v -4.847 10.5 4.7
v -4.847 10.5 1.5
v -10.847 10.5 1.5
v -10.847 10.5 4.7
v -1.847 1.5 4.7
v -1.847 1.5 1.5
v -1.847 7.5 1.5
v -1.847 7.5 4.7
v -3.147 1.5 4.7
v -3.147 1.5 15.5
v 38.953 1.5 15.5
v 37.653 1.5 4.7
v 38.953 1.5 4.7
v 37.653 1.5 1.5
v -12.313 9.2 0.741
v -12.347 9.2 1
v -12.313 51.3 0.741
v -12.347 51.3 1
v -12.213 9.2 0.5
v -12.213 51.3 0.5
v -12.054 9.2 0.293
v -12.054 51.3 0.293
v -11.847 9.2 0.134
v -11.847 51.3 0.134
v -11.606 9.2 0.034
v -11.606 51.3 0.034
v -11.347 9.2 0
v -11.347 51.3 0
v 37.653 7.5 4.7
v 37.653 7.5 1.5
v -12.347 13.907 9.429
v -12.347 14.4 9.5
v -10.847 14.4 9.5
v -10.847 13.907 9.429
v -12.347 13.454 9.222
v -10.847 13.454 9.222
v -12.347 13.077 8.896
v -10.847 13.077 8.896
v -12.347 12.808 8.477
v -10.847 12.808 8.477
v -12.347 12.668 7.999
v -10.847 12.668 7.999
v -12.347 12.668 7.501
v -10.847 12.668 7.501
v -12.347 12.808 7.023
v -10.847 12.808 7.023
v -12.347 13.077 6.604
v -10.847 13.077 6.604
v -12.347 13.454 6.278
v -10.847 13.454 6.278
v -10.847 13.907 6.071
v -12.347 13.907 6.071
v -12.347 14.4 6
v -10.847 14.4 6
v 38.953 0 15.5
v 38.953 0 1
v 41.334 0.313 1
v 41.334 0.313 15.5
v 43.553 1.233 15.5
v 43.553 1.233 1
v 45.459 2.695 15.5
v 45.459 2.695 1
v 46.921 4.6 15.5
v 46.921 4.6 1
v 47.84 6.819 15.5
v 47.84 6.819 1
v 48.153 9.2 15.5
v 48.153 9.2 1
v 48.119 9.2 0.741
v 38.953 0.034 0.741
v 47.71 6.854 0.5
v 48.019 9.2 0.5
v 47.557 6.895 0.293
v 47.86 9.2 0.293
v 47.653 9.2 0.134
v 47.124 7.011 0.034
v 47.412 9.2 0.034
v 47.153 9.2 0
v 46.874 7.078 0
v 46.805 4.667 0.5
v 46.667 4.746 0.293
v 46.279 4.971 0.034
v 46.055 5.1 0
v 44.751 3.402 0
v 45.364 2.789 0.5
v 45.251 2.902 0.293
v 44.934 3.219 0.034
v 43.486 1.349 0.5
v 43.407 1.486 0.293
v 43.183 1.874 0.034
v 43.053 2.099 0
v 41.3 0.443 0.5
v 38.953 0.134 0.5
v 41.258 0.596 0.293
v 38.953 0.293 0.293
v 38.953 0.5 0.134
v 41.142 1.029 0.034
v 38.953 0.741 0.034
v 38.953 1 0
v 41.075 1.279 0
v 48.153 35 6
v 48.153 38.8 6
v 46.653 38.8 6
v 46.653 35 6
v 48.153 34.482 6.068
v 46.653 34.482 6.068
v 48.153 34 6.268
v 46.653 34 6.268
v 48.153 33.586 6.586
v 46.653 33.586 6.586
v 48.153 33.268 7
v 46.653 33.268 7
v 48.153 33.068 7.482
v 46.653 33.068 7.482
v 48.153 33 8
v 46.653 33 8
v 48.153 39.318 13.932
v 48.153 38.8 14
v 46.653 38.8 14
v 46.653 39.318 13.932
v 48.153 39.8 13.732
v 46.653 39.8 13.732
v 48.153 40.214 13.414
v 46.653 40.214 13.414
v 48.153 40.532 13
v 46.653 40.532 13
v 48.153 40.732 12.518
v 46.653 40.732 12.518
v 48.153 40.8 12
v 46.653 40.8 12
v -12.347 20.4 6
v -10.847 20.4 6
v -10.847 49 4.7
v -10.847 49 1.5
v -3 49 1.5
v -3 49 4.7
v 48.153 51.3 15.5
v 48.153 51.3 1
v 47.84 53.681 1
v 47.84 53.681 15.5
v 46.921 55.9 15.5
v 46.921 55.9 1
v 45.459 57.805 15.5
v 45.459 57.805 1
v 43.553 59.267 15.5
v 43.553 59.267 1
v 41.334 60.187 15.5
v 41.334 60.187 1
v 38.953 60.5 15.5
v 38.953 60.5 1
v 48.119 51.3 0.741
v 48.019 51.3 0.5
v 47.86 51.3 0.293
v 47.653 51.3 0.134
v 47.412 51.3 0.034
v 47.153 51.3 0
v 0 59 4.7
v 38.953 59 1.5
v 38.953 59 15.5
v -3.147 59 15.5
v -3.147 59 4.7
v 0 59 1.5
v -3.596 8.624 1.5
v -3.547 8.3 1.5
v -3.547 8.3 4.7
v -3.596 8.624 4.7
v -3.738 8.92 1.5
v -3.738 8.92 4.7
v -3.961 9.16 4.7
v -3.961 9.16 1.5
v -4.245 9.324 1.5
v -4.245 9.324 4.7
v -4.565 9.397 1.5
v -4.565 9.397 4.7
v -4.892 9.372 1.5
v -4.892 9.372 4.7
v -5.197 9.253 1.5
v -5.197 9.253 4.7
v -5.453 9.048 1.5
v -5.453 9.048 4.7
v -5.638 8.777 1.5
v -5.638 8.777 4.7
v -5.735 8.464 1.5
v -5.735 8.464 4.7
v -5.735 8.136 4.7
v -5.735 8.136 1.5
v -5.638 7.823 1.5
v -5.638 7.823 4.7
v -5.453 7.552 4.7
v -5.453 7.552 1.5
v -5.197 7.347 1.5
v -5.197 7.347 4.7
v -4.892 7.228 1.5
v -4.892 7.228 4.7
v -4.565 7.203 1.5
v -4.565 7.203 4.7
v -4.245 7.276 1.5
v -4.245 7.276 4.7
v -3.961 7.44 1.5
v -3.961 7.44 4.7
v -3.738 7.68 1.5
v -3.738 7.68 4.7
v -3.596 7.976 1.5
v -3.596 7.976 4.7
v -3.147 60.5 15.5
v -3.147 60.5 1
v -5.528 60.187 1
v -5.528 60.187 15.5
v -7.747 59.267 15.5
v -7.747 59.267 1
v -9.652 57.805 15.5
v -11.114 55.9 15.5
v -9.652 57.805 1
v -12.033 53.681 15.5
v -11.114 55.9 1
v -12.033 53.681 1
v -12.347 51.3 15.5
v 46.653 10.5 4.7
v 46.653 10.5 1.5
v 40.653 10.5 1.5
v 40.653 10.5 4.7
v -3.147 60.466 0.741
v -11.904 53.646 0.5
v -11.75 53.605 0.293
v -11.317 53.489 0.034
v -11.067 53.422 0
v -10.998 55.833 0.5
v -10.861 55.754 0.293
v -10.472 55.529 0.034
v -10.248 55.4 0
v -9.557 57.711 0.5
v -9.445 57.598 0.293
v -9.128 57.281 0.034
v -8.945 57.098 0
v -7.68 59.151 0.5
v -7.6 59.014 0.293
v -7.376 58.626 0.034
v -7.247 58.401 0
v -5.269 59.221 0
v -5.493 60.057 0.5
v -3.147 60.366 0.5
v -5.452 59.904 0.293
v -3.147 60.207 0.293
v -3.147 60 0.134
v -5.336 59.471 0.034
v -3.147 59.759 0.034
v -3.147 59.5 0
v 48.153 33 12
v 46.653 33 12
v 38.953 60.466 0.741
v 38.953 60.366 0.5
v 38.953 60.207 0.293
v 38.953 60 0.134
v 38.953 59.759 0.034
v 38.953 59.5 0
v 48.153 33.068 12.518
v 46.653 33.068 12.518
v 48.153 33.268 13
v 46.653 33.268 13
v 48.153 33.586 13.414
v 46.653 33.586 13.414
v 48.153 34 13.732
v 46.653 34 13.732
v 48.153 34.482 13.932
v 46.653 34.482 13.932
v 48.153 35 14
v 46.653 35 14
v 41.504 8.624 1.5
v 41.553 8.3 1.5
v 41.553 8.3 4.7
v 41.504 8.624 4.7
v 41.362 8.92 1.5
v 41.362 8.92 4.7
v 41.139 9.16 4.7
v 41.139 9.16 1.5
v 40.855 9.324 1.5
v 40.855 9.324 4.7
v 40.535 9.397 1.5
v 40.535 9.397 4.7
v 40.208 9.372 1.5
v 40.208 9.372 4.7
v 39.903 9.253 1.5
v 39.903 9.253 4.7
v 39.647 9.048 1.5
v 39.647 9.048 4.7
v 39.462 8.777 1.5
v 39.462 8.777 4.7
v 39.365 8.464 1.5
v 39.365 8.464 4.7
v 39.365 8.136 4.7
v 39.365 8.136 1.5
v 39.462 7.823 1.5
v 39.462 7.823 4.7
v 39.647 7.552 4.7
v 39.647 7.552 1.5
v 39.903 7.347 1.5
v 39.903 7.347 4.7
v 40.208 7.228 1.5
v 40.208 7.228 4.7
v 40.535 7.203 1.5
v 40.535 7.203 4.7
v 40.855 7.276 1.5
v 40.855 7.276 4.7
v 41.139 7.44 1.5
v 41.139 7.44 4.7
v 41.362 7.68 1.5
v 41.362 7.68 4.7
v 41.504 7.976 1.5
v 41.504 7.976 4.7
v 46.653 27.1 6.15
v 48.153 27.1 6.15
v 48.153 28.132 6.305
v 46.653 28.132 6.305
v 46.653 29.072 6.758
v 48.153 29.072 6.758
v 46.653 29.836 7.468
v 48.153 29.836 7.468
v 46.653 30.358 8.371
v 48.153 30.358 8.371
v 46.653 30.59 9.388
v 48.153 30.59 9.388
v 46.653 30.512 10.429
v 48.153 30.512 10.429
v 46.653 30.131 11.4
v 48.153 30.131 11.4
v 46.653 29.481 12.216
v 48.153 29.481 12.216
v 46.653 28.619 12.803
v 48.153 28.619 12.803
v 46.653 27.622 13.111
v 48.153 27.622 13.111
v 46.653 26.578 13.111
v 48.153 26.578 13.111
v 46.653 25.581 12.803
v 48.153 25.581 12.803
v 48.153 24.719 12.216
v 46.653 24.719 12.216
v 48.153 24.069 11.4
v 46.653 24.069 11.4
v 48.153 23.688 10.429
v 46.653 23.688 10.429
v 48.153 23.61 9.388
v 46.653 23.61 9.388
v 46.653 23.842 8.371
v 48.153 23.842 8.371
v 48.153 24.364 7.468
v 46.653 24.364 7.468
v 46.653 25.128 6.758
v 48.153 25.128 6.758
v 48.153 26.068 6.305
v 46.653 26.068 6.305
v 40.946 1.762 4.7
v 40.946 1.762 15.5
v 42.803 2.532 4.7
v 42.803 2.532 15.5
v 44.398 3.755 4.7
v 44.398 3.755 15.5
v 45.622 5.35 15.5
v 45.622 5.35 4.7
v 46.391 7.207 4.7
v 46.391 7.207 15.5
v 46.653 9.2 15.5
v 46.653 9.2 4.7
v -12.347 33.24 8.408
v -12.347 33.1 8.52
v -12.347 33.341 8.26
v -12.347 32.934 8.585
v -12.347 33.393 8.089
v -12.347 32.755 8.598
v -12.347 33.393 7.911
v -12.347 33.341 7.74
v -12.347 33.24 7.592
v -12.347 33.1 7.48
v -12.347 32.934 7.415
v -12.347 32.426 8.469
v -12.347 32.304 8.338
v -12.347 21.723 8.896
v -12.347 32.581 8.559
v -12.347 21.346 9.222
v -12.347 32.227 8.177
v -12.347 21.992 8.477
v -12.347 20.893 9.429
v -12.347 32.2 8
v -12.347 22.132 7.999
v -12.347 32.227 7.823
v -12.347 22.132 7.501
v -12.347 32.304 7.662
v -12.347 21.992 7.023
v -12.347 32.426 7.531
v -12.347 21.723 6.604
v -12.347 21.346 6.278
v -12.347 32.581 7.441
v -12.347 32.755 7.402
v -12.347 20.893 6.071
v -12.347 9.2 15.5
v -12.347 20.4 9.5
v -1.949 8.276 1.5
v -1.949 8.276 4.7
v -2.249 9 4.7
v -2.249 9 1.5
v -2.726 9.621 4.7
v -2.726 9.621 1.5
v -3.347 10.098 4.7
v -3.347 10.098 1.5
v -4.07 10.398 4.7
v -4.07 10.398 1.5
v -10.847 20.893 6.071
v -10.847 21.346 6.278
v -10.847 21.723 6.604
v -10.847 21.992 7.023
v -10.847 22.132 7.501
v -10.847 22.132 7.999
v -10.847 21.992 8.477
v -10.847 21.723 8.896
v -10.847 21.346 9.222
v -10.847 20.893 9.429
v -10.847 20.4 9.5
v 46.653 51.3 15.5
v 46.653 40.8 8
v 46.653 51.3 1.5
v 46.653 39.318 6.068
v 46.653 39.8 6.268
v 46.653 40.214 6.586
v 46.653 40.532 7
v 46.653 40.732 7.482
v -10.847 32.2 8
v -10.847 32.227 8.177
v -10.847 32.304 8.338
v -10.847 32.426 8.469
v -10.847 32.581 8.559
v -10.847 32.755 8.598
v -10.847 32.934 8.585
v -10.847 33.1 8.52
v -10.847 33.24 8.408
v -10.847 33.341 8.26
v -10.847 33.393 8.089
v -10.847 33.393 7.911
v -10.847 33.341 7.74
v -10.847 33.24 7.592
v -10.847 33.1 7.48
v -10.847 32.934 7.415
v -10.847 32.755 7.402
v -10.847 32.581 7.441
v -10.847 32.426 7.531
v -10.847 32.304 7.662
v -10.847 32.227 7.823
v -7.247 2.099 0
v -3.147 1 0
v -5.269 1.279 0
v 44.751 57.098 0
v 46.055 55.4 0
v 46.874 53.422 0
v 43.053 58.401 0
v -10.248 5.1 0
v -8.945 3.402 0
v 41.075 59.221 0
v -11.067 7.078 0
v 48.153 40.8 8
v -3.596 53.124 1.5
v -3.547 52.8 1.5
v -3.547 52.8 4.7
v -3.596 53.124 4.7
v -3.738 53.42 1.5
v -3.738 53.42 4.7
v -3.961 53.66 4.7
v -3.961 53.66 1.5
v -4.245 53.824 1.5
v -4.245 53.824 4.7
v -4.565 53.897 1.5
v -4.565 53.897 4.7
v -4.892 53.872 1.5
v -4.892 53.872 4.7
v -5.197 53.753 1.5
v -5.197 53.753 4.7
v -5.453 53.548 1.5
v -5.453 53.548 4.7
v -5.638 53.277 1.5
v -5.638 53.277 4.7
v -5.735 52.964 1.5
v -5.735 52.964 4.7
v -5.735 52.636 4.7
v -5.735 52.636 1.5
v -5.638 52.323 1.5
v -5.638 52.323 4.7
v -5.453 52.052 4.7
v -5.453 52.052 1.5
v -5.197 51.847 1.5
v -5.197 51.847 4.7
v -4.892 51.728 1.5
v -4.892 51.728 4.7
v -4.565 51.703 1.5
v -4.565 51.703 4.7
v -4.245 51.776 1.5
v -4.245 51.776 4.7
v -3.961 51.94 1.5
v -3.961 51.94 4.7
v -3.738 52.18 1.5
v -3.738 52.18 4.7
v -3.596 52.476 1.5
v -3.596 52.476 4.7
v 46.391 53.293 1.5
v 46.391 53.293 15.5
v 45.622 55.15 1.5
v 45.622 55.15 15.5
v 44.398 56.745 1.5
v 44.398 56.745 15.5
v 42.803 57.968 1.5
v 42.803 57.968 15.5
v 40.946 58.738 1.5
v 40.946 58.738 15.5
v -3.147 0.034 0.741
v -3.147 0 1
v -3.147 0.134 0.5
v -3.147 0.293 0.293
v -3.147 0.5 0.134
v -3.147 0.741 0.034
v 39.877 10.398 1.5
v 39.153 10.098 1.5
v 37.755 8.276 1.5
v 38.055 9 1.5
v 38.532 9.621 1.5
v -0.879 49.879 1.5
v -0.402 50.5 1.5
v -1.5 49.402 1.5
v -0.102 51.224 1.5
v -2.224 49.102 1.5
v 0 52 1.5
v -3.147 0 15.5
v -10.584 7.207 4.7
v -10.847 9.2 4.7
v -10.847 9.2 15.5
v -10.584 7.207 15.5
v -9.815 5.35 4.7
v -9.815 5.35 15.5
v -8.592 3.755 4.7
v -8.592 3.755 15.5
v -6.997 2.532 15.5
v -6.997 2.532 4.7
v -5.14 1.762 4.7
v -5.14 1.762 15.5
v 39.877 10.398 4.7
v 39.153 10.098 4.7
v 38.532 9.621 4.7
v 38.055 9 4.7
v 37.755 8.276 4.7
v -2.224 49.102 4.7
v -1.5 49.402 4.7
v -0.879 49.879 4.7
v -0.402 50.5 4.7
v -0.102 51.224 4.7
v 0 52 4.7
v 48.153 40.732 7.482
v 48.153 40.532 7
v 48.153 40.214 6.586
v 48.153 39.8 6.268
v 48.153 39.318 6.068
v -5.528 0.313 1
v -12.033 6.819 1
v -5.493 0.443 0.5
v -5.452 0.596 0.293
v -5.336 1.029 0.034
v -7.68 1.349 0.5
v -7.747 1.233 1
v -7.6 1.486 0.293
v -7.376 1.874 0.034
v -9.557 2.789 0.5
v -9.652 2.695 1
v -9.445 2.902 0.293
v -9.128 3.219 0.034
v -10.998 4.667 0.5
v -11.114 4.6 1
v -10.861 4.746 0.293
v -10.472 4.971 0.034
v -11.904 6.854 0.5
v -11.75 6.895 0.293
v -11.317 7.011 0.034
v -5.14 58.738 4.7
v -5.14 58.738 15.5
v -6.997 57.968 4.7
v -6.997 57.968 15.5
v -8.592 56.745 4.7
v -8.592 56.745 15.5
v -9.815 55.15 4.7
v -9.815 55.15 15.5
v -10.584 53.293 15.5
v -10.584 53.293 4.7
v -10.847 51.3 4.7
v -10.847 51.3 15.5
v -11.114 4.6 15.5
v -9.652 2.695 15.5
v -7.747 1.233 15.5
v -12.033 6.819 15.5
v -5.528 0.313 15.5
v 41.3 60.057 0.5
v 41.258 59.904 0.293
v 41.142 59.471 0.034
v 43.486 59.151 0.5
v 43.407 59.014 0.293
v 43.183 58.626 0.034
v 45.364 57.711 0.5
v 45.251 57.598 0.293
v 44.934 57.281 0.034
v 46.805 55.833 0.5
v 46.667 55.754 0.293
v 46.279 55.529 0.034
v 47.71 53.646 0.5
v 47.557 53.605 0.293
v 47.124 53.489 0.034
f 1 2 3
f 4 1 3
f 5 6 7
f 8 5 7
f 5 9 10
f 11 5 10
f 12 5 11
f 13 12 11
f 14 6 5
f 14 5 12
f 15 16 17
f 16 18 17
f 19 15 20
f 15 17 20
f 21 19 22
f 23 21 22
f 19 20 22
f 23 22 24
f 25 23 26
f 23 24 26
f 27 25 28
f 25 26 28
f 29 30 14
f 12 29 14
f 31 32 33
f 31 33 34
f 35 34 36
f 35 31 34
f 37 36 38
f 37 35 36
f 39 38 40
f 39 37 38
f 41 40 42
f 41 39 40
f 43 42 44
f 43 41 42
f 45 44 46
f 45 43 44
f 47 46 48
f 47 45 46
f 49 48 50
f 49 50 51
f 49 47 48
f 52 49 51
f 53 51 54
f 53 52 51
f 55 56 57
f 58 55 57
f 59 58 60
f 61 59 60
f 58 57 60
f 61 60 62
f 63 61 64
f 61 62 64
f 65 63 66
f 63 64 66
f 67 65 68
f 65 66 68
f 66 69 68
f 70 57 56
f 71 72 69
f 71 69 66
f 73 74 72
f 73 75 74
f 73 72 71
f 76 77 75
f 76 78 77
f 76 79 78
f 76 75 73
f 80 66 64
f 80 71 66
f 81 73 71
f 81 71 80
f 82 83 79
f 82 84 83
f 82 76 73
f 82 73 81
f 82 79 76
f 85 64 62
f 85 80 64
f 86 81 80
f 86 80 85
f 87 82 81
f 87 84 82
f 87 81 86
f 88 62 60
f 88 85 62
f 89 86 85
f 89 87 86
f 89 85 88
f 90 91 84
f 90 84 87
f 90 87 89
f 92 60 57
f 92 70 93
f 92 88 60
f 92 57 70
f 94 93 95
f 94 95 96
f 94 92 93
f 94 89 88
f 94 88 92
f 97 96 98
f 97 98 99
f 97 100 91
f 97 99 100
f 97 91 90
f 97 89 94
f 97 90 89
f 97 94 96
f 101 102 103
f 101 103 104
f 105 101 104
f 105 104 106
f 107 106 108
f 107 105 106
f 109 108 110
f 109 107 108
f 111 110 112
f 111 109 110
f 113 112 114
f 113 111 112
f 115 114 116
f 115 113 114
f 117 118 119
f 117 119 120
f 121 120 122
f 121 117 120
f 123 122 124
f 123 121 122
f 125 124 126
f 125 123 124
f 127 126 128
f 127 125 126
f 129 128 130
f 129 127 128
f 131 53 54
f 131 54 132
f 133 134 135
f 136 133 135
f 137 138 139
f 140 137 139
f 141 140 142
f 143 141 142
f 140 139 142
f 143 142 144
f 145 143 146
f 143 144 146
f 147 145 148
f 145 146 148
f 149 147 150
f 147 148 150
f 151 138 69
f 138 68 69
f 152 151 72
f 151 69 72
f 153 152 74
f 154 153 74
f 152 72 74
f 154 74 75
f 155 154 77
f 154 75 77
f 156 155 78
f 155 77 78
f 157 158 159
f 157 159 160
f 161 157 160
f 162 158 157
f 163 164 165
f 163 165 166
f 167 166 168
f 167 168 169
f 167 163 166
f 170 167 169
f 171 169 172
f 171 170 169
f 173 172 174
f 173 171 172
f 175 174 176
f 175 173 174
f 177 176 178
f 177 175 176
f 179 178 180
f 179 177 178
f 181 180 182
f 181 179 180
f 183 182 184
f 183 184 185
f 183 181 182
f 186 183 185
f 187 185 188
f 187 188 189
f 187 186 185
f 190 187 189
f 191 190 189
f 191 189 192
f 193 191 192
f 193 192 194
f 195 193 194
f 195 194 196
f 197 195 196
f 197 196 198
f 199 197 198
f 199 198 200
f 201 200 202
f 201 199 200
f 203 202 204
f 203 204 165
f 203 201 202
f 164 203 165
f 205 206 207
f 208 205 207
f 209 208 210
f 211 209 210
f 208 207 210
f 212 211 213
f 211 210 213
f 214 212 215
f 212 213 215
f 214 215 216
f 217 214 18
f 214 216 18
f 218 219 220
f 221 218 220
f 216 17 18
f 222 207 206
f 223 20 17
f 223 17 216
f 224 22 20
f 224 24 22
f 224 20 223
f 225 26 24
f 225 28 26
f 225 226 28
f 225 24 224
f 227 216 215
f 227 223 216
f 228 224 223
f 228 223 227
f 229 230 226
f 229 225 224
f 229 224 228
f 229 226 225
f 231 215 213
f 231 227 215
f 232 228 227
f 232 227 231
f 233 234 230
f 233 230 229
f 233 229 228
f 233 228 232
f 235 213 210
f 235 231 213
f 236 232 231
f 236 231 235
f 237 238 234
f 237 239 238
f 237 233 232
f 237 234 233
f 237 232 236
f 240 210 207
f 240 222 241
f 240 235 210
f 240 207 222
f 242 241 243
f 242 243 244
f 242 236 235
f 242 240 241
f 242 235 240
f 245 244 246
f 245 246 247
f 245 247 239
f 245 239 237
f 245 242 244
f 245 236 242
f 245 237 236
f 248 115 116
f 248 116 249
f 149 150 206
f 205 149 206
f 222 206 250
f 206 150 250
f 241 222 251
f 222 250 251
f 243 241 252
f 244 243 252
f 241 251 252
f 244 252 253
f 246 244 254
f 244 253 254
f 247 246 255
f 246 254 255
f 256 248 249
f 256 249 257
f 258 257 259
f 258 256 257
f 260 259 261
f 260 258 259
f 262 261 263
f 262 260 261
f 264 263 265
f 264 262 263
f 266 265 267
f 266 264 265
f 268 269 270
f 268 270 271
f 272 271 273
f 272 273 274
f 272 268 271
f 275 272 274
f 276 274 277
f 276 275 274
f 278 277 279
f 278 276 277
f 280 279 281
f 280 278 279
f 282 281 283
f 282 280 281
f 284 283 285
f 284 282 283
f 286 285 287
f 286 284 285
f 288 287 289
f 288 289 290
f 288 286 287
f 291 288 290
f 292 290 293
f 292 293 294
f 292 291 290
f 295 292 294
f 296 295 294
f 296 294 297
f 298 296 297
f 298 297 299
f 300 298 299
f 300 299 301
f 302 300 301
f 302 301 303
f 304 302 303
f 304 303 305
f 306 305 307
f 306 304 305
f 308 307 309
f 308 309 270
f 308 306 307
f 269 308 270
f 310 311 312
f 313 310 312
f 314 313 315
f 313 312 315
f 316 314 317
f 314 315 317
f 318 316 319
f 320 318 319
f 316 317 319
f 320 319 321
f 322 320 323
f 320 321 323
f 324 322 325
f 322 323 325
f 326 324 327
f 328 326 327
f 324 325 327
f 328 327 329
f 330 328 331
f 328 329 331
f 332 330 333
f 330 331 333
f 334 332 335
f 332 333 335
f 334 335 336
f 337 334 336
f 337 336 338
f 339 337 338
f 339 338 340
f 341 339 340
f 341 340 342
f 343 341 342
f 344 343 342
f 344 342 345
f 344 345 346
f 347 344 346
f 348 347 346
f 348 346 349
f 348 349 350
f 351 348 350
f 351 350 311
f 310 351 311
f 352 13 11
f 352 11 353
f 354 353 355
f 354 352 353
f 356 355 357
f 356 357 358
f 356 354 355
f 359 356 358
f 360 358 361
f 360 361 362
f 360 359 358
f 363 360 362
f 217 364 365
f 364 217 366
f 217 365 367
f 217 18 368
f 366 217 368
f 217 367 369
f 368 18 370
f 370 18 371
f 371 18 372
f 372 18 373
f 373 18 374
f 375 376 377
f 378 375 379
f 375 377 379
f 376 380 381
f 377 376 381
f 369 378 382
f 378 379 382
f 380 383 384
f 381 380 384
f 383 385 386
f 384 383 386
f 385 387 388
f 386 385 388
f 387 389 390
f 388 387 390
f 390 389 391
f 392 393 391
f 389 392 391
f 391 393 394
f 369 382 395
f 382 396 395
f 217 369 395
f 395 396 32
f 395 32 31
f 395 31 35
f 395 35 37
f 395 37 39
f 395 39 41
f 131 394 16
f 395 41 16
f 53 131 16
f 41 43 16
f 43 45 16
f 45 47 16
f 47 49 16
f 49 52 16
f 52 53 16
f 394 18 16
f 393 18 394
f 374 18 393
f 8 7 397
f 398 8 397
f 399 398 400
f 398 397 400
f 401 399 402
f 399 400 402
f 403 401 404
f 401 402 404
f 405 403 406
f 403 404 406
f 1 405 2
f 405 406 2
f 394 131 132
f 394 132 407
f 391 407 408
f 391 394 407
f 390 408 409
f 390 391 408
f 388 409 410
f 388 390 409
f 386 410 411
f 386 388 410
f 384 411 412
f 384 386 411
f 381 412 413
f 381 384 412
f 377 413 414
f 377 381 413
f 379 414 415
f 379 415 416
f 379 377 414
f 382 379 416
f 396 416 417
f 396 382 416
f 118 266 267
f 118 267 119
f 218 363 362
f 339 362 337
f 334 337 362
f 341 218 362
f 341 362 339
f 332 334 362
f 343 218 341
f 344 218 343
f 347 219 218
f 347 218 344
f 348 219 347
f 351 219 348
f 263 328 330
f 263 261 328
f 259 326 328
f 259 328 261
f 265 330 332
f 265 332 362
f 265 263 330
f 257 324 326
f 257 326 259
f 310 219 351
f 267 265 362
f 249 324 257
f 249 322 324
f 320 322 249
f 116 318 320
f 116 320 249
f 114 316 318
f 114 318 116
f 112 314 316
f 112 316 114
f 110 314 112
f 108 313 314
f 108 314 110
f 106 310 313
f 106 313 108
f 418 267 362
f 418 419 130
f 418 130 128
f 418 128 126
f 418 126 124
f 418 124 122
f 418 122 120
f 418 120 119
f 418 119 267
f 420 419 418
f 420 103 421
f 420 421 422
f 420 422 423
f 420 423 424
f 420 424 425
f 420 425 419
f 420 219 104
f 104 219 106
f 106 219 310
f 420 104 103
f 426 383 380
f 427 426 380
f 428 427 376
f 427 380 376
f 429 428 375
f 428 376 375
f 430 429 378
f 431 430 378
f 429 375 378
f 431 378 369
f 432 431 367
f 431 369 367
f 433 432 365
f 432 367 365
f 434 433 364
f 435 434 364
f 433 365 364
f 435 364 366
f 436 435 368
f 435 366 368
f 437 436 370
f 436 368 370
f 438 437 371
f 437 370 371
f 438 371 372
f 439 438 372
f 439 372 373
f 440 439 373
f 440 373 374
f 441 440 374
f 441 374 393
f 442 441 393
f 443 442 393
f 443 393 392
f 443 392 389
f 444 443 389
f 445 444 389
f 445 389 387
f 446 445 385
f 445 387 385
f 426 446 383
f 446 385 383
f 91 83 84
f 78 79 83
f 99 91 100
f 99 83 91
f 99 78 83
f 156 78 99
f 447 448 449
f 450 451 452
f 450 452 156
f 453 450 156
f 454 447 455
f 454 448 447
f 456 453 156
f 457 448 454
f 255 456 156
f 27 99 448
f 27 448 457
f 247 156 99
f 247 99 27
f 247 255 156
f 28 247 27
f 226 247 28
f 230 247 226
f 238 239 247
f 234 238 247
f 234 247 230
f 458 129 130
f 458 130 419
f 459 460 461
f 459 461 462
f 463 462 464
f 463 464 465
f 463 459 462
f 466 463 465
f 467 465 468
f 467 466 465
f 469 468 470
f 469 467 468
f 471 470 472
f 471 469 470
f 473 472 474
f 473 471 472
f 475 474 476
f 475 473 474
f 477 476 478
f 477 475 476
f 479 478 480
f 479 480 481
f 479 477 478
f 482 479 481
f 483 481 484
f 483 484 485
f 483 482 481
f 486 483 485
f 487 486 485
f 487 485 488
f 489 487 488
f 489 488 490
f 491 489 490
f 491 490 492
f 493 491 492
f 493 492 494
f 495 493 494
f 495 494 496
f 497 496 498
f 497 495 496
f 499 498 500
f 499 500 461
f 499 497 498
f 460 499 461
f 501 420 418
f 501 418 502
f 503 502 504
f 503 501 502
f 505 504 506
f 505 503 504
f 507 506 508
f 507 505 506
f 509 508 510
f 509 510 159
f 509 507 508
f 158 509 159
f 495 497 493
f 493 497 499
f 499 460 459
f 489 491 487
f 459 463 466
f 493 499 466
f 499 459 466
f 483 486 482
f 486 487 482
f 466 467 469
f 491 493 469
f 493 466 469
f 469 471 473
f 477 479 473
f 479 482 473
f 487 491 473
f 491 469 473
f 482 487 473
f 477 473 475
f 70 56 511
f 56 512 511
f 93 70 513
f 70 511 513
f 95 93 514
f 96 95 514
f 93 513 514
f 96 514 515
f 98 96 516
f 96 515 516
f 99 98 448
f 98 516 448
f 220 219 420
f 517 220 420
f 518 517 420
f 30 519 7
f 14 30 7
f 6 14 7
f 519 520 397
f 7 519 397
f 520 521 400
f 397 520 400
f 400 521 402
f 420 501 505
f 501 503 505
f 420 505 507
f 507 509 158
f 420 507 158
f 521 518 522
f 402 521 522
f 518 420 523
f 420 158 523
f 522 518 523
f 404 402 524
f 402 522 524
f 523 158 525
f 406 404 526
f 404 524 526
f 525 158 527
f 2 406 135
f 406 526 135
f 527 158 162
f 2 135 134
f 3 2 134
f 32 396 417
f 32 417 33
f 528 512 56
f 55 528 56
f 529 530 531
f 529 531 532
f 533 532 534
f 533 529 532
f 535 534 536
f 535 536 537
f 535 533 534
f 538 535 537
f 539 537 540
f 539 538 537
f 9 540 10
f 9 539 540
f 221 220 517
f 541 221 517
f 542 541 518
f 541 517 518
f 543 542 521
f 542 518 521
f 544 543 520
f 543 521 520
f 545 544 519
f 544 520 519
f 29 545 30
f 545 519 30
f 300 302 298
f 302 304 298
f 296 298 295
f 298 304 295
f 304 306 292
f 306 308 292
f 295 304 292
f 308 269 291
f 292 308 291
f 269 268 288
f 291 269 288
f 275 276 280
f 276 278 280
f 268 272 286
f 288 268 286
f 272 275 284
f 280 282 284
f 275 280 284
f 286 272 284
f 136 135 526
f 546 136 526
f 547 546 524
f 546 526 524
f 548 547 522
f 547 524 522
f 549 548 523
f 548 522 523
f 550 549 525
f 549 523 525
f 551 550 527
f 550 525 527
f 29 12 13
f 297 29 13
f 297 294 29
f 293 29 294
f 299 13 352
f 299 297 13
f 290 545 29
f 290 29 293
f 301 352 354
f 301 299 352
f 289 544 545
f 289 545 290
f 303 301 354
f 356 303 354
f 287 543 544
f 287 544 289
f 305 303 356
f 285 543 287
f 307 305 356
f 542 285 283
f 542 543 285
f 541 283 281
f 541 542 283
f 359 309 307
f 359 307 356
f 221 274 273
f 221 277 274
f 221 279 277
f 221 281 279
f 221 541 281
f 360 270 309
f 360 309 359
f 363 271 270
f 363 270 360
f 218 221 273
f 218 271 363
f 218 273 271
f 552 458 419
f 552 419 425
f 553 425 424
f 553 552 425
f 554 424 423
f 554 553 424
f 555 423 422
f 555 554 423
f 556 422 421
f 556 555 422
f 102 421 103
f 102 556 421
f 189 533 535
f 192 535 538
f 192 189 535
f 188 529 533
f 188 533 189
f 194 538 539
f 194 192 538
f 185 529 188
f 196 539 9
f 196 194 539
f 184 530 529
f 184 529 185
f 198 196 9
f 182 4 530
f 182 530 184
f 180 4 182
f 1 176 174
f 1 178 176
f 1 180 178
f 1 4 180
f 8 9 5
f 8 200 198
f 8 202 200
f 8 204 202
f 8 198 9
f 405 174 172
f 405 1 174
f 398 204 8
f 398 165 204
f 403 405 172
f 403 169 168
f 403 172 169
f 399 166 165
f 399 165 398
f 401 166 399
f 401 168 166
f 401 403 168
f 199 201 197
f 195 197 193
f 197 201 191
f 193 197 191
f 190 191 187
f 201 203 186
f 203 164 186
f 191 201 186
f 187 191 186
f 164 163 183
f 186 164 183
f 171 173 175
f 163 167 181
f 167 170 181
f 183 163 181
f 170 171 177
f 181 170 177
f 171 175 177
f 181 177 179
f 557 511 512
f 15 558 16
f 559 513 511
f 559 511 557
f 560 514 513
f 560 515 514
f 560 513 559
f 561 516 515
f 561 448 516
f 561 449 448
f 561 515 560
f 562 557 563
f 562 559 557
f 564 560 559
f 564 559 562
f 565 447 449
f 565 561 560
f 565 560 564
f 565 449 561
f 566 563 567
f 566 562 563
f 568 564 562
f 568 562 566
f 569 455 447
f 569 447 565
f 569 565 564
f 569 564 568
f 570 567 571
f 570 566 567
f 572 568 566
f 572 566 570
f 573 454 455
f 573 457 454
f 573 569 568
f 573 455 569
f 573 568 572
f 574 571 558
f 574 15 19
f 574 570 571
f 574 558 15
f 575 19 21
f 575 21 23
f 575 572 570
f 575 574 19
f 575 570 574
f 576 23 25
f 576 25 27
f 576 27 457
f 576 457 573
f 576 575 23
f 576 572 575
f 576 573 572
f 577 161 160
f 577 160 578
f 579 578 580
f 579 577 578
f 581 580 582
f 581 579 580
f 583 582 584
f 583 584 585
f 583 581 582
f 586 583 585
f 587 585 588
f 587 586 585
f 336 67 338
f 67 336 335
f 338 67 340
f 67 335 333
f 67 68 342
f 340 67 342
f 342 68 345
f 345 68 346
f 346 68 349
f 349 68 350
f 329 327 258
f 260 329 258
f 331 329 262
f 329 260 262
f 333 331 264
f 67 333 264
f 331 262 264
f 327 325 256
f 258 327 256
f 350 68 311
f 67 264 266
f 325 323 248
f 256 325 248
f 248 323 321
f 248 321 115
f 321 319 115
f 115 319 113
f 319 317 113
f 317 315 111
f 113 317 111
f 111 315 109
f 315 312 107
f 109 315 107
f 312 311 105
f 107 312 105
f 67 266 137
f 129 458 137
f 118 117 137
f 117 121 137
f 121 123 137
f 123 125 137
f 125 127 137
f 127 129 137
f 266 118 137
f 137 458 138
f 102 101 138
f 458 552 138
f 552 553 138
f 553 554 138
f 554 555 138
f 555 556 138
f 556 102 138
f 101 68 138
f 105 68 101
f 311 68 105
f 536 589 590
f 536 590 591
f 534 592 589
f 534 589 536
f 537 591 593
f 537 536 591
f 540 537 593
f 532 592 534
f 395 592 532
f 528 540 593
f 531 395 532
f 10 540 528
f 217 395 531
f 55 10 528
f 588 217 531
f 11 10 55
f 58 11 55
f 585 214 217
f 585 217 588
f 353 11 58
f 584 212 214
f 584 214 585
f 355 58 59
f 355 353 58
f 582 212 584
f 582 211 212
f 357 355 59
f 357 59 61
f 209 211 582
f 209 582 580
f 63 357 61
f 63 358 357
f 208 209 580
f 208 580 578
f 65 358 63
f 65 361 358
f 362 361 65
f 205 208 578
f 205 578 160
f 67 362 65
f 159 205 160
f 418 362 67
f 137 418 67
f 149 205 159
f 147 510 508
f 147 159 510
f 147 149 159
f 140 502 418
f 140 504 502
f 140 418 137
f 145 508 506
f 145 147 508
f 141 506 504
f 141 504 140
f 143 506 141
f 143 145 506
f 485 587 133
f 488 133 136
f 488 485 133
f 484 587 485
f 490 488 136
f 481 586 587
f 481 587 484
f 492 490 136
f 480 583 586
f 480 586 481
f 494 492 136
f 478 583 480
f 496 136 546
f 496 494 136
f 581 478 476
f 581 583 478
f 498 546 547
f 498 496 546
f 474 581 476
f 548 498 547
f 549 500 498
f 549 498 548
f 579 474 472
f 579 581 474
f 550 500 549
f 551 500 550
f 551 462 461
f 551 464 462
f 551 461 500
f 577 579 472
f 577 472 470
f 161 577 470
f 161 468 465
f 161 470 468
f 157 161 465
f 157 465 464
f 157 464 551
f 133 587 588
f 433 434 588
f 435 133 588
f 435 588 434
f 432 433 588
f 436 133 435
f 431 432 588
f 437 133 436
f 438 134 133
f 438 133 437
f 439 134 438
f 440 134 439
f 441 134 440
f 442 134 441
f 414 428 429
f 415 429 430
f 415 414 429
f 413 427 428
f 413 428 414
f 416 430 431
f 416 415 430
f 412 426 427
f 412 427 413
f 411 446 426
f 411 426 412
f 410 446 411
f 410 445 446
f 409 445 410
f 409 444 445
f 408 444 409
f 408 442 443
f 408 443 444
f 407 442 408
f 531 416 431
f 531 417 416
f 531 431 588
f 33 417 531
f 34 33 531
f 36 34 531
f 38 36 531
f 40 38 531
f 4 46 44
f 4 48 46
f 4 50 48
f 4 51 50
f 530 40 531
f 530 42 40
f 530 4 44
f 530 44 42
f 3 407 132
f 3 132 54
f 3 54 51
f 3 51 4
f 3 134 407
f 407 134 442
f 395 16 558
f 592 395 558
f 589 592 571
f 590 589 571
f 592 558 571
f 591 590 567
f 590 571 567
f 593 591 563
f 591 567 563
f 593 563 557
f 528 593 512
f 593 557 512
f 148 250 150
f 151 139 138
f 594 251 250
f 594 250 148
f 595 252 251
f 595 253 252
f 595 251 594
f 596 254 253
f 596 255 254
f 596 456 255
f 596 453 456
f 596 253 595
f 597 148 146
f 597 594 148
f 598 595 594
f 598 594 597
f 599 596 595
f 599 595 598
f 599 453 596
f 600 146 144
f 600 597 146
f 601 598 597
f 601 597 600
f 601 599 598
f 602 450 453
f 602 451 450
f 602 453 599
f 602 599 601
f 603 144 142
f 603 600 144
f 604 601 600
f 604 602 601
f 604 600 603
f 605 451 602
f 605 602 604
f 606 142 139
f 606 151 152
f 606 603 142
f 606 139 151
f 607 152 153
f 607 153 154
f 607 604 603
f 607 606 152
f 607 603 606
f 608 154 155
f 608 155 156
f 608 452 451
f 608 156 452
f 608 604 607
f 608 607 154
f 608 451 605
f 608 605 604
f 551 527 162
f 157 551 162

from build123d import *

# Parameters (mm, degrees)
EXTRUDE_1_DEPTH     = 1.5
EXTRUDE_3_DEPTH     = 14
SKETCH_4_R          = 1.1
EXTRUDE_4_DEPTH     = 3.2
SKETCH_5_R          = 1.1
EXTRUDE_5_DEPTH     = 3.2
SKETCH_8_R          = 1.1
EXTRUDE_7_DEPTH     = 3.2
SKETCH_9_R          = 0.6
CUT_EXTRUDE_5_DEPTH = 1.5
CUT_EXTRUDE_6_DEPTH = 1.5
CUT_EXTRUDE_7_REACH = 88.953
SKETCH_16_R         = 3.5
FILLET_1_R          = 1


with BuildPart() as part:
    # 草图1 → 凸台-拉伸1 (new body)
    with BuildSketch(Plane.XY):
        with BuildLine():
            Line((-3.146845785, 60.5), (38.953154215, 60.5))
            ThreePointArc((38.953154215, 60.5), (45.458536602, 57.805382387), (48.153154215, 51.3))
            Line((48.153154215, 51.3), (48.153154215, 9.2))
            ThreePointArc((48.153154215, 9.2), (45.458536602, 2.694617613), (38.953154215, 0))
            Line((38.953154215, 0), (-3.146845785, 0))
            ThreePointArc((-3.146845785, 0), (-9.652228172, 2.694617613), (-12.346845785, 9.2))
            Line((-12.346845785, 9.2), (-12.346845785, 51.3))
            ThreePointArc((-12.346845785, 51.3), (-9.652228172, 57.805382387), (-3.146845785, 60.5))
        make_face()
    extrude(amount=EXTRUDE_1_DEPTH)

    # 草图3 → 凸台-拉伸3 (add)
    with BuildSketch(Plane.XY.offset(1.5)):
        with BuildLine():
            Line((38.953154215, 60.5), (-3.146845785, 60.5))
            ThreePointArc((-3.146845785, 60.5), (-9.652228172, 57.805382387), (-12.346845785, 51.3))
            Line((-12.346845785, 51.3), (-12.346845785, 9.2))
            ThreePointArc((-12.346845785, 9.2), (-9.652228172, 2.694617613), (-3.146845785, 0))
            Line((-3.146845785, 0), (38.953154215, 0))
            ThreePointArc((38.953154215, 0), (45.458536602, 2.694617613), (48.153154215, 9.2))
            Line((48.153154215, 9.2), (48.153154215, 51.3))
            ThreePointArc((48.153154215, 51.3), (45.458536602, 57.805382387), (38.953154215, 60.5))
        make_face()
        with BuildLine():
            Line((38.953154215, 59), (-3.146845785, 59))
            ThreePointArc((-3.146845785, 59), (-8.591568001, 56.744722215), (-10.846845785, 51.3))
            Line((-10.846845785, 51.3), (-10.846845785, 9.2))
            ThreePointArc((-10.846845785, 9.2), (-8.591568001, 3.755277785), (-3.146845785, 1.5))
            Line((-3.146845785, 1.5), (38.953154215, 1.5))
            ThreePointArc((38.953154215, 1.5), (44.39787643, 3.755277785), (46.653154215, 9.2))
            Line((46.653154215, 9.2), (46.653154215, 51.3))
            ThreePointArc((46.653154215, 51.3), (44.39787643, 56.744722215), (38.953154215, 59))
        make_face(mode=Mode.SUBTRACT)
    extrude(amount=EXTRUDE_3_DEPTH)

    # 草图4 → 凸台-拉伸4 (add)
    with BuildSketch(Plane.XY.offset(1.5)):
        with BuildLine():
            Line((0, 52), (0, 59))
            Line((0, 59), (-3.146845785, 59))
            ThreePointArc((-3.146845785, 59), (-8.591568001, 56.744722215), (-10.846845785, 51.3))
            Line((-10.846845785, 51.3), (-10.846845785, 49))
            Line((-10.846845785, 49), (-3, 49))
            ThreePointArc((-3, 49), (-0.878679656, 49.878679656), (0, 52))
        make_face()
        with Locations((-4.646845785, 52.8)):
            Circle(SKETCH_4_R, mode=Mode.SUBTRACT)
    extrude(amount=EXTRUDE_4_DEPTH)

    # 草图5 → 凸台-拉伸5 (add)
    with BuildSketch(Plane.XY.offset(1.5)):
        with BuildLine():
            Line((-4.846845785, 10.5), (-10.846845785, 10.5))
            Line((-10.846845785, 10.5), (-10.846845785, 9.2))
            ThreePointArc((-10.846845785, 9.2), (-8.591568001, 3.755277785), (-3.146845785, 1.5))
            Line((-3.146845785, 1.5), (-1.846845785, 1.5))
            Line((-1.846845785, 1.5), (-1.846845785, 7.5))
            ThreePointArc((-1.846845785, 7.5), (-2.725525442, 9.621320344), (-4.846845785, 10.5))
        make_face()
        with Locations((-4.646845785, 8.3)):
            Circle(SKETCH_5_R, mode=Mode.SUBTRACT)
    extrude(amount=EXTRUDE_5_DEPTH)

    # 草图8 → 凸台-拉伸7 (add)
    with BuildSketch(Plane.XY.offset(1.5)):
        with BuildLine():
            Line((37.653154215, 7.5), (37.653154215, 1.5))
            Line((37.653154215, 1.5), (38.953154215, 1.5))
            ThreePointArc((38.953154215, 1.5), (44.39787643, 3.755277785), (46.653154215, 9.2))
            Line((46.653154215, 9.2), (46.653154215, 10.5))
            Line((46.653154215, 10.5), (40.653154215, 10.5))
            ThreePointArc((40.653154215, 10.5), (38.531833871, 9.621320344), (37.653154215, 7.5))
        make_face()
        with Locations((40.453154215, 8.3)):
            Circle(SKETCH_8_R, mode=Mode.SUBTRACT)
    extrude(amount=EXTRUDE_7_DEPTH)

    # 草图9 → 切除-拉伸5 (cut)
    with BuildSketch(Plane.ZY.offset(12.346845785)):
        with Locations(Location((8, 32.8, 0), (0, 0, 270))):
            Circle(SKETCH_9_R)
    extrude(amount=-CUT_EXTRUDE_5_DEPTH, mode=Mode.SUBTRACT)

    # 草图10 → 切除-拉伸6 (cut)
    with BuildSketch(Plane.ZY.offset(12.346845785)):
        with BuildLine():
            Line((9.5, 20.4), (9.5, 14.4))
            ThreePointArc((9.5, 14.4), (7.75, 12.65), (6, 14.4))
            Line((6, 14.4), (6, 20.4))
            ThreePointArc((6, 20.4), (7.75, 22.15), (9.5, 20.4))
        make_face()
    extrude(amount=-CUT_EXTRUDE_6_DEPTH, mode=Mode.SUBTRACT)

    # 草图16 → 切除-拉伸7 (cut, up to next)
    with BuildSketch(Plane(origin=(48.153154215, 0, 0), x_dir=(0, 0, -1), z_dir=(1, 0, 0)), mode=Mode.PRIVATE) as cut_extrude_7_sk1:
        with Locations((-9.65, 27.1)):
            Circle(SKETCH_16_R)
    cut_extrude_7_tool1 = extrude(cut_extrude_7_sk1.sketch, amount=-CUT_EXTRUDE_7_REACH, mode=Mode.PRIVATE) & part.part
    # 草图16 → 切除-拉伸7 (cut, up to next)
    with BuildSketch(Plane(origin=(48.153154215, 0, 0), x_dir=(0, 0, -1), z_dir=(1, 0, 0)), mode=Mode.PRIVATE) as cut_extrude_7_sk2:
        with BuildLine():
            Line((-12, 40.8), (-8, 40.8))
            ThreePointArc((-8, 40.8), (-6.585786438, 40.214213562), (-6, 38.8))
            Line((-6, 38.8), (-6, 35))
            ThreePointArc((-6, 35), (-6.585786438, 33.585786438), (-8, 33))
            Line((-8, 33), (-12, 33))
            ThreePointArc((-12, 33), (-13.414213562, 33.585786438), (-14, 35))
            Line((-14, 35), (-14, 38.8))
            ThreePointArc((-14, 38.8), (-13.414213562, 40.214213562), (-12, 40.8))
        make_face()
    cut_extrude_7_tool2 = extrude(cut_extrude_7_sk2.sketch, amount=-CUT_EXTRUDE_7_REACH, mode=Mode.PRIVATE) & part.part
    add(cut_extrude_7_tool1.solids().sort_by_distance((48.153154, 27.1, 9.65))[0], mode=Mode.SUBTRACT)
    add(cut_extrude_7_tool2.solids().sort_by_distance((48.153154, 36.9, 10))[0], mode=Mode.SUBTRACT)

    # 圆角1
    fillet_1_edges = [part.edges().sort_by_distance(p)[0] for p in [
        (-12.346845785, 30.25, 0),
        (-9.652228172, 57.805382387, 0),
        (17.903154215, 60.5, 0),
        (45.458536602, 57.805382387, 0),
        (48.153154215, 30.25, 0),
        (45.458536602, 2.694617613, 0),
        (17.903154215, 0, 0),
        (-9.652228172, 2.694617613, 0),
    ]]
    fillet(fillet_1_edges, radius=FILLET_1_R)


solid = part.part
